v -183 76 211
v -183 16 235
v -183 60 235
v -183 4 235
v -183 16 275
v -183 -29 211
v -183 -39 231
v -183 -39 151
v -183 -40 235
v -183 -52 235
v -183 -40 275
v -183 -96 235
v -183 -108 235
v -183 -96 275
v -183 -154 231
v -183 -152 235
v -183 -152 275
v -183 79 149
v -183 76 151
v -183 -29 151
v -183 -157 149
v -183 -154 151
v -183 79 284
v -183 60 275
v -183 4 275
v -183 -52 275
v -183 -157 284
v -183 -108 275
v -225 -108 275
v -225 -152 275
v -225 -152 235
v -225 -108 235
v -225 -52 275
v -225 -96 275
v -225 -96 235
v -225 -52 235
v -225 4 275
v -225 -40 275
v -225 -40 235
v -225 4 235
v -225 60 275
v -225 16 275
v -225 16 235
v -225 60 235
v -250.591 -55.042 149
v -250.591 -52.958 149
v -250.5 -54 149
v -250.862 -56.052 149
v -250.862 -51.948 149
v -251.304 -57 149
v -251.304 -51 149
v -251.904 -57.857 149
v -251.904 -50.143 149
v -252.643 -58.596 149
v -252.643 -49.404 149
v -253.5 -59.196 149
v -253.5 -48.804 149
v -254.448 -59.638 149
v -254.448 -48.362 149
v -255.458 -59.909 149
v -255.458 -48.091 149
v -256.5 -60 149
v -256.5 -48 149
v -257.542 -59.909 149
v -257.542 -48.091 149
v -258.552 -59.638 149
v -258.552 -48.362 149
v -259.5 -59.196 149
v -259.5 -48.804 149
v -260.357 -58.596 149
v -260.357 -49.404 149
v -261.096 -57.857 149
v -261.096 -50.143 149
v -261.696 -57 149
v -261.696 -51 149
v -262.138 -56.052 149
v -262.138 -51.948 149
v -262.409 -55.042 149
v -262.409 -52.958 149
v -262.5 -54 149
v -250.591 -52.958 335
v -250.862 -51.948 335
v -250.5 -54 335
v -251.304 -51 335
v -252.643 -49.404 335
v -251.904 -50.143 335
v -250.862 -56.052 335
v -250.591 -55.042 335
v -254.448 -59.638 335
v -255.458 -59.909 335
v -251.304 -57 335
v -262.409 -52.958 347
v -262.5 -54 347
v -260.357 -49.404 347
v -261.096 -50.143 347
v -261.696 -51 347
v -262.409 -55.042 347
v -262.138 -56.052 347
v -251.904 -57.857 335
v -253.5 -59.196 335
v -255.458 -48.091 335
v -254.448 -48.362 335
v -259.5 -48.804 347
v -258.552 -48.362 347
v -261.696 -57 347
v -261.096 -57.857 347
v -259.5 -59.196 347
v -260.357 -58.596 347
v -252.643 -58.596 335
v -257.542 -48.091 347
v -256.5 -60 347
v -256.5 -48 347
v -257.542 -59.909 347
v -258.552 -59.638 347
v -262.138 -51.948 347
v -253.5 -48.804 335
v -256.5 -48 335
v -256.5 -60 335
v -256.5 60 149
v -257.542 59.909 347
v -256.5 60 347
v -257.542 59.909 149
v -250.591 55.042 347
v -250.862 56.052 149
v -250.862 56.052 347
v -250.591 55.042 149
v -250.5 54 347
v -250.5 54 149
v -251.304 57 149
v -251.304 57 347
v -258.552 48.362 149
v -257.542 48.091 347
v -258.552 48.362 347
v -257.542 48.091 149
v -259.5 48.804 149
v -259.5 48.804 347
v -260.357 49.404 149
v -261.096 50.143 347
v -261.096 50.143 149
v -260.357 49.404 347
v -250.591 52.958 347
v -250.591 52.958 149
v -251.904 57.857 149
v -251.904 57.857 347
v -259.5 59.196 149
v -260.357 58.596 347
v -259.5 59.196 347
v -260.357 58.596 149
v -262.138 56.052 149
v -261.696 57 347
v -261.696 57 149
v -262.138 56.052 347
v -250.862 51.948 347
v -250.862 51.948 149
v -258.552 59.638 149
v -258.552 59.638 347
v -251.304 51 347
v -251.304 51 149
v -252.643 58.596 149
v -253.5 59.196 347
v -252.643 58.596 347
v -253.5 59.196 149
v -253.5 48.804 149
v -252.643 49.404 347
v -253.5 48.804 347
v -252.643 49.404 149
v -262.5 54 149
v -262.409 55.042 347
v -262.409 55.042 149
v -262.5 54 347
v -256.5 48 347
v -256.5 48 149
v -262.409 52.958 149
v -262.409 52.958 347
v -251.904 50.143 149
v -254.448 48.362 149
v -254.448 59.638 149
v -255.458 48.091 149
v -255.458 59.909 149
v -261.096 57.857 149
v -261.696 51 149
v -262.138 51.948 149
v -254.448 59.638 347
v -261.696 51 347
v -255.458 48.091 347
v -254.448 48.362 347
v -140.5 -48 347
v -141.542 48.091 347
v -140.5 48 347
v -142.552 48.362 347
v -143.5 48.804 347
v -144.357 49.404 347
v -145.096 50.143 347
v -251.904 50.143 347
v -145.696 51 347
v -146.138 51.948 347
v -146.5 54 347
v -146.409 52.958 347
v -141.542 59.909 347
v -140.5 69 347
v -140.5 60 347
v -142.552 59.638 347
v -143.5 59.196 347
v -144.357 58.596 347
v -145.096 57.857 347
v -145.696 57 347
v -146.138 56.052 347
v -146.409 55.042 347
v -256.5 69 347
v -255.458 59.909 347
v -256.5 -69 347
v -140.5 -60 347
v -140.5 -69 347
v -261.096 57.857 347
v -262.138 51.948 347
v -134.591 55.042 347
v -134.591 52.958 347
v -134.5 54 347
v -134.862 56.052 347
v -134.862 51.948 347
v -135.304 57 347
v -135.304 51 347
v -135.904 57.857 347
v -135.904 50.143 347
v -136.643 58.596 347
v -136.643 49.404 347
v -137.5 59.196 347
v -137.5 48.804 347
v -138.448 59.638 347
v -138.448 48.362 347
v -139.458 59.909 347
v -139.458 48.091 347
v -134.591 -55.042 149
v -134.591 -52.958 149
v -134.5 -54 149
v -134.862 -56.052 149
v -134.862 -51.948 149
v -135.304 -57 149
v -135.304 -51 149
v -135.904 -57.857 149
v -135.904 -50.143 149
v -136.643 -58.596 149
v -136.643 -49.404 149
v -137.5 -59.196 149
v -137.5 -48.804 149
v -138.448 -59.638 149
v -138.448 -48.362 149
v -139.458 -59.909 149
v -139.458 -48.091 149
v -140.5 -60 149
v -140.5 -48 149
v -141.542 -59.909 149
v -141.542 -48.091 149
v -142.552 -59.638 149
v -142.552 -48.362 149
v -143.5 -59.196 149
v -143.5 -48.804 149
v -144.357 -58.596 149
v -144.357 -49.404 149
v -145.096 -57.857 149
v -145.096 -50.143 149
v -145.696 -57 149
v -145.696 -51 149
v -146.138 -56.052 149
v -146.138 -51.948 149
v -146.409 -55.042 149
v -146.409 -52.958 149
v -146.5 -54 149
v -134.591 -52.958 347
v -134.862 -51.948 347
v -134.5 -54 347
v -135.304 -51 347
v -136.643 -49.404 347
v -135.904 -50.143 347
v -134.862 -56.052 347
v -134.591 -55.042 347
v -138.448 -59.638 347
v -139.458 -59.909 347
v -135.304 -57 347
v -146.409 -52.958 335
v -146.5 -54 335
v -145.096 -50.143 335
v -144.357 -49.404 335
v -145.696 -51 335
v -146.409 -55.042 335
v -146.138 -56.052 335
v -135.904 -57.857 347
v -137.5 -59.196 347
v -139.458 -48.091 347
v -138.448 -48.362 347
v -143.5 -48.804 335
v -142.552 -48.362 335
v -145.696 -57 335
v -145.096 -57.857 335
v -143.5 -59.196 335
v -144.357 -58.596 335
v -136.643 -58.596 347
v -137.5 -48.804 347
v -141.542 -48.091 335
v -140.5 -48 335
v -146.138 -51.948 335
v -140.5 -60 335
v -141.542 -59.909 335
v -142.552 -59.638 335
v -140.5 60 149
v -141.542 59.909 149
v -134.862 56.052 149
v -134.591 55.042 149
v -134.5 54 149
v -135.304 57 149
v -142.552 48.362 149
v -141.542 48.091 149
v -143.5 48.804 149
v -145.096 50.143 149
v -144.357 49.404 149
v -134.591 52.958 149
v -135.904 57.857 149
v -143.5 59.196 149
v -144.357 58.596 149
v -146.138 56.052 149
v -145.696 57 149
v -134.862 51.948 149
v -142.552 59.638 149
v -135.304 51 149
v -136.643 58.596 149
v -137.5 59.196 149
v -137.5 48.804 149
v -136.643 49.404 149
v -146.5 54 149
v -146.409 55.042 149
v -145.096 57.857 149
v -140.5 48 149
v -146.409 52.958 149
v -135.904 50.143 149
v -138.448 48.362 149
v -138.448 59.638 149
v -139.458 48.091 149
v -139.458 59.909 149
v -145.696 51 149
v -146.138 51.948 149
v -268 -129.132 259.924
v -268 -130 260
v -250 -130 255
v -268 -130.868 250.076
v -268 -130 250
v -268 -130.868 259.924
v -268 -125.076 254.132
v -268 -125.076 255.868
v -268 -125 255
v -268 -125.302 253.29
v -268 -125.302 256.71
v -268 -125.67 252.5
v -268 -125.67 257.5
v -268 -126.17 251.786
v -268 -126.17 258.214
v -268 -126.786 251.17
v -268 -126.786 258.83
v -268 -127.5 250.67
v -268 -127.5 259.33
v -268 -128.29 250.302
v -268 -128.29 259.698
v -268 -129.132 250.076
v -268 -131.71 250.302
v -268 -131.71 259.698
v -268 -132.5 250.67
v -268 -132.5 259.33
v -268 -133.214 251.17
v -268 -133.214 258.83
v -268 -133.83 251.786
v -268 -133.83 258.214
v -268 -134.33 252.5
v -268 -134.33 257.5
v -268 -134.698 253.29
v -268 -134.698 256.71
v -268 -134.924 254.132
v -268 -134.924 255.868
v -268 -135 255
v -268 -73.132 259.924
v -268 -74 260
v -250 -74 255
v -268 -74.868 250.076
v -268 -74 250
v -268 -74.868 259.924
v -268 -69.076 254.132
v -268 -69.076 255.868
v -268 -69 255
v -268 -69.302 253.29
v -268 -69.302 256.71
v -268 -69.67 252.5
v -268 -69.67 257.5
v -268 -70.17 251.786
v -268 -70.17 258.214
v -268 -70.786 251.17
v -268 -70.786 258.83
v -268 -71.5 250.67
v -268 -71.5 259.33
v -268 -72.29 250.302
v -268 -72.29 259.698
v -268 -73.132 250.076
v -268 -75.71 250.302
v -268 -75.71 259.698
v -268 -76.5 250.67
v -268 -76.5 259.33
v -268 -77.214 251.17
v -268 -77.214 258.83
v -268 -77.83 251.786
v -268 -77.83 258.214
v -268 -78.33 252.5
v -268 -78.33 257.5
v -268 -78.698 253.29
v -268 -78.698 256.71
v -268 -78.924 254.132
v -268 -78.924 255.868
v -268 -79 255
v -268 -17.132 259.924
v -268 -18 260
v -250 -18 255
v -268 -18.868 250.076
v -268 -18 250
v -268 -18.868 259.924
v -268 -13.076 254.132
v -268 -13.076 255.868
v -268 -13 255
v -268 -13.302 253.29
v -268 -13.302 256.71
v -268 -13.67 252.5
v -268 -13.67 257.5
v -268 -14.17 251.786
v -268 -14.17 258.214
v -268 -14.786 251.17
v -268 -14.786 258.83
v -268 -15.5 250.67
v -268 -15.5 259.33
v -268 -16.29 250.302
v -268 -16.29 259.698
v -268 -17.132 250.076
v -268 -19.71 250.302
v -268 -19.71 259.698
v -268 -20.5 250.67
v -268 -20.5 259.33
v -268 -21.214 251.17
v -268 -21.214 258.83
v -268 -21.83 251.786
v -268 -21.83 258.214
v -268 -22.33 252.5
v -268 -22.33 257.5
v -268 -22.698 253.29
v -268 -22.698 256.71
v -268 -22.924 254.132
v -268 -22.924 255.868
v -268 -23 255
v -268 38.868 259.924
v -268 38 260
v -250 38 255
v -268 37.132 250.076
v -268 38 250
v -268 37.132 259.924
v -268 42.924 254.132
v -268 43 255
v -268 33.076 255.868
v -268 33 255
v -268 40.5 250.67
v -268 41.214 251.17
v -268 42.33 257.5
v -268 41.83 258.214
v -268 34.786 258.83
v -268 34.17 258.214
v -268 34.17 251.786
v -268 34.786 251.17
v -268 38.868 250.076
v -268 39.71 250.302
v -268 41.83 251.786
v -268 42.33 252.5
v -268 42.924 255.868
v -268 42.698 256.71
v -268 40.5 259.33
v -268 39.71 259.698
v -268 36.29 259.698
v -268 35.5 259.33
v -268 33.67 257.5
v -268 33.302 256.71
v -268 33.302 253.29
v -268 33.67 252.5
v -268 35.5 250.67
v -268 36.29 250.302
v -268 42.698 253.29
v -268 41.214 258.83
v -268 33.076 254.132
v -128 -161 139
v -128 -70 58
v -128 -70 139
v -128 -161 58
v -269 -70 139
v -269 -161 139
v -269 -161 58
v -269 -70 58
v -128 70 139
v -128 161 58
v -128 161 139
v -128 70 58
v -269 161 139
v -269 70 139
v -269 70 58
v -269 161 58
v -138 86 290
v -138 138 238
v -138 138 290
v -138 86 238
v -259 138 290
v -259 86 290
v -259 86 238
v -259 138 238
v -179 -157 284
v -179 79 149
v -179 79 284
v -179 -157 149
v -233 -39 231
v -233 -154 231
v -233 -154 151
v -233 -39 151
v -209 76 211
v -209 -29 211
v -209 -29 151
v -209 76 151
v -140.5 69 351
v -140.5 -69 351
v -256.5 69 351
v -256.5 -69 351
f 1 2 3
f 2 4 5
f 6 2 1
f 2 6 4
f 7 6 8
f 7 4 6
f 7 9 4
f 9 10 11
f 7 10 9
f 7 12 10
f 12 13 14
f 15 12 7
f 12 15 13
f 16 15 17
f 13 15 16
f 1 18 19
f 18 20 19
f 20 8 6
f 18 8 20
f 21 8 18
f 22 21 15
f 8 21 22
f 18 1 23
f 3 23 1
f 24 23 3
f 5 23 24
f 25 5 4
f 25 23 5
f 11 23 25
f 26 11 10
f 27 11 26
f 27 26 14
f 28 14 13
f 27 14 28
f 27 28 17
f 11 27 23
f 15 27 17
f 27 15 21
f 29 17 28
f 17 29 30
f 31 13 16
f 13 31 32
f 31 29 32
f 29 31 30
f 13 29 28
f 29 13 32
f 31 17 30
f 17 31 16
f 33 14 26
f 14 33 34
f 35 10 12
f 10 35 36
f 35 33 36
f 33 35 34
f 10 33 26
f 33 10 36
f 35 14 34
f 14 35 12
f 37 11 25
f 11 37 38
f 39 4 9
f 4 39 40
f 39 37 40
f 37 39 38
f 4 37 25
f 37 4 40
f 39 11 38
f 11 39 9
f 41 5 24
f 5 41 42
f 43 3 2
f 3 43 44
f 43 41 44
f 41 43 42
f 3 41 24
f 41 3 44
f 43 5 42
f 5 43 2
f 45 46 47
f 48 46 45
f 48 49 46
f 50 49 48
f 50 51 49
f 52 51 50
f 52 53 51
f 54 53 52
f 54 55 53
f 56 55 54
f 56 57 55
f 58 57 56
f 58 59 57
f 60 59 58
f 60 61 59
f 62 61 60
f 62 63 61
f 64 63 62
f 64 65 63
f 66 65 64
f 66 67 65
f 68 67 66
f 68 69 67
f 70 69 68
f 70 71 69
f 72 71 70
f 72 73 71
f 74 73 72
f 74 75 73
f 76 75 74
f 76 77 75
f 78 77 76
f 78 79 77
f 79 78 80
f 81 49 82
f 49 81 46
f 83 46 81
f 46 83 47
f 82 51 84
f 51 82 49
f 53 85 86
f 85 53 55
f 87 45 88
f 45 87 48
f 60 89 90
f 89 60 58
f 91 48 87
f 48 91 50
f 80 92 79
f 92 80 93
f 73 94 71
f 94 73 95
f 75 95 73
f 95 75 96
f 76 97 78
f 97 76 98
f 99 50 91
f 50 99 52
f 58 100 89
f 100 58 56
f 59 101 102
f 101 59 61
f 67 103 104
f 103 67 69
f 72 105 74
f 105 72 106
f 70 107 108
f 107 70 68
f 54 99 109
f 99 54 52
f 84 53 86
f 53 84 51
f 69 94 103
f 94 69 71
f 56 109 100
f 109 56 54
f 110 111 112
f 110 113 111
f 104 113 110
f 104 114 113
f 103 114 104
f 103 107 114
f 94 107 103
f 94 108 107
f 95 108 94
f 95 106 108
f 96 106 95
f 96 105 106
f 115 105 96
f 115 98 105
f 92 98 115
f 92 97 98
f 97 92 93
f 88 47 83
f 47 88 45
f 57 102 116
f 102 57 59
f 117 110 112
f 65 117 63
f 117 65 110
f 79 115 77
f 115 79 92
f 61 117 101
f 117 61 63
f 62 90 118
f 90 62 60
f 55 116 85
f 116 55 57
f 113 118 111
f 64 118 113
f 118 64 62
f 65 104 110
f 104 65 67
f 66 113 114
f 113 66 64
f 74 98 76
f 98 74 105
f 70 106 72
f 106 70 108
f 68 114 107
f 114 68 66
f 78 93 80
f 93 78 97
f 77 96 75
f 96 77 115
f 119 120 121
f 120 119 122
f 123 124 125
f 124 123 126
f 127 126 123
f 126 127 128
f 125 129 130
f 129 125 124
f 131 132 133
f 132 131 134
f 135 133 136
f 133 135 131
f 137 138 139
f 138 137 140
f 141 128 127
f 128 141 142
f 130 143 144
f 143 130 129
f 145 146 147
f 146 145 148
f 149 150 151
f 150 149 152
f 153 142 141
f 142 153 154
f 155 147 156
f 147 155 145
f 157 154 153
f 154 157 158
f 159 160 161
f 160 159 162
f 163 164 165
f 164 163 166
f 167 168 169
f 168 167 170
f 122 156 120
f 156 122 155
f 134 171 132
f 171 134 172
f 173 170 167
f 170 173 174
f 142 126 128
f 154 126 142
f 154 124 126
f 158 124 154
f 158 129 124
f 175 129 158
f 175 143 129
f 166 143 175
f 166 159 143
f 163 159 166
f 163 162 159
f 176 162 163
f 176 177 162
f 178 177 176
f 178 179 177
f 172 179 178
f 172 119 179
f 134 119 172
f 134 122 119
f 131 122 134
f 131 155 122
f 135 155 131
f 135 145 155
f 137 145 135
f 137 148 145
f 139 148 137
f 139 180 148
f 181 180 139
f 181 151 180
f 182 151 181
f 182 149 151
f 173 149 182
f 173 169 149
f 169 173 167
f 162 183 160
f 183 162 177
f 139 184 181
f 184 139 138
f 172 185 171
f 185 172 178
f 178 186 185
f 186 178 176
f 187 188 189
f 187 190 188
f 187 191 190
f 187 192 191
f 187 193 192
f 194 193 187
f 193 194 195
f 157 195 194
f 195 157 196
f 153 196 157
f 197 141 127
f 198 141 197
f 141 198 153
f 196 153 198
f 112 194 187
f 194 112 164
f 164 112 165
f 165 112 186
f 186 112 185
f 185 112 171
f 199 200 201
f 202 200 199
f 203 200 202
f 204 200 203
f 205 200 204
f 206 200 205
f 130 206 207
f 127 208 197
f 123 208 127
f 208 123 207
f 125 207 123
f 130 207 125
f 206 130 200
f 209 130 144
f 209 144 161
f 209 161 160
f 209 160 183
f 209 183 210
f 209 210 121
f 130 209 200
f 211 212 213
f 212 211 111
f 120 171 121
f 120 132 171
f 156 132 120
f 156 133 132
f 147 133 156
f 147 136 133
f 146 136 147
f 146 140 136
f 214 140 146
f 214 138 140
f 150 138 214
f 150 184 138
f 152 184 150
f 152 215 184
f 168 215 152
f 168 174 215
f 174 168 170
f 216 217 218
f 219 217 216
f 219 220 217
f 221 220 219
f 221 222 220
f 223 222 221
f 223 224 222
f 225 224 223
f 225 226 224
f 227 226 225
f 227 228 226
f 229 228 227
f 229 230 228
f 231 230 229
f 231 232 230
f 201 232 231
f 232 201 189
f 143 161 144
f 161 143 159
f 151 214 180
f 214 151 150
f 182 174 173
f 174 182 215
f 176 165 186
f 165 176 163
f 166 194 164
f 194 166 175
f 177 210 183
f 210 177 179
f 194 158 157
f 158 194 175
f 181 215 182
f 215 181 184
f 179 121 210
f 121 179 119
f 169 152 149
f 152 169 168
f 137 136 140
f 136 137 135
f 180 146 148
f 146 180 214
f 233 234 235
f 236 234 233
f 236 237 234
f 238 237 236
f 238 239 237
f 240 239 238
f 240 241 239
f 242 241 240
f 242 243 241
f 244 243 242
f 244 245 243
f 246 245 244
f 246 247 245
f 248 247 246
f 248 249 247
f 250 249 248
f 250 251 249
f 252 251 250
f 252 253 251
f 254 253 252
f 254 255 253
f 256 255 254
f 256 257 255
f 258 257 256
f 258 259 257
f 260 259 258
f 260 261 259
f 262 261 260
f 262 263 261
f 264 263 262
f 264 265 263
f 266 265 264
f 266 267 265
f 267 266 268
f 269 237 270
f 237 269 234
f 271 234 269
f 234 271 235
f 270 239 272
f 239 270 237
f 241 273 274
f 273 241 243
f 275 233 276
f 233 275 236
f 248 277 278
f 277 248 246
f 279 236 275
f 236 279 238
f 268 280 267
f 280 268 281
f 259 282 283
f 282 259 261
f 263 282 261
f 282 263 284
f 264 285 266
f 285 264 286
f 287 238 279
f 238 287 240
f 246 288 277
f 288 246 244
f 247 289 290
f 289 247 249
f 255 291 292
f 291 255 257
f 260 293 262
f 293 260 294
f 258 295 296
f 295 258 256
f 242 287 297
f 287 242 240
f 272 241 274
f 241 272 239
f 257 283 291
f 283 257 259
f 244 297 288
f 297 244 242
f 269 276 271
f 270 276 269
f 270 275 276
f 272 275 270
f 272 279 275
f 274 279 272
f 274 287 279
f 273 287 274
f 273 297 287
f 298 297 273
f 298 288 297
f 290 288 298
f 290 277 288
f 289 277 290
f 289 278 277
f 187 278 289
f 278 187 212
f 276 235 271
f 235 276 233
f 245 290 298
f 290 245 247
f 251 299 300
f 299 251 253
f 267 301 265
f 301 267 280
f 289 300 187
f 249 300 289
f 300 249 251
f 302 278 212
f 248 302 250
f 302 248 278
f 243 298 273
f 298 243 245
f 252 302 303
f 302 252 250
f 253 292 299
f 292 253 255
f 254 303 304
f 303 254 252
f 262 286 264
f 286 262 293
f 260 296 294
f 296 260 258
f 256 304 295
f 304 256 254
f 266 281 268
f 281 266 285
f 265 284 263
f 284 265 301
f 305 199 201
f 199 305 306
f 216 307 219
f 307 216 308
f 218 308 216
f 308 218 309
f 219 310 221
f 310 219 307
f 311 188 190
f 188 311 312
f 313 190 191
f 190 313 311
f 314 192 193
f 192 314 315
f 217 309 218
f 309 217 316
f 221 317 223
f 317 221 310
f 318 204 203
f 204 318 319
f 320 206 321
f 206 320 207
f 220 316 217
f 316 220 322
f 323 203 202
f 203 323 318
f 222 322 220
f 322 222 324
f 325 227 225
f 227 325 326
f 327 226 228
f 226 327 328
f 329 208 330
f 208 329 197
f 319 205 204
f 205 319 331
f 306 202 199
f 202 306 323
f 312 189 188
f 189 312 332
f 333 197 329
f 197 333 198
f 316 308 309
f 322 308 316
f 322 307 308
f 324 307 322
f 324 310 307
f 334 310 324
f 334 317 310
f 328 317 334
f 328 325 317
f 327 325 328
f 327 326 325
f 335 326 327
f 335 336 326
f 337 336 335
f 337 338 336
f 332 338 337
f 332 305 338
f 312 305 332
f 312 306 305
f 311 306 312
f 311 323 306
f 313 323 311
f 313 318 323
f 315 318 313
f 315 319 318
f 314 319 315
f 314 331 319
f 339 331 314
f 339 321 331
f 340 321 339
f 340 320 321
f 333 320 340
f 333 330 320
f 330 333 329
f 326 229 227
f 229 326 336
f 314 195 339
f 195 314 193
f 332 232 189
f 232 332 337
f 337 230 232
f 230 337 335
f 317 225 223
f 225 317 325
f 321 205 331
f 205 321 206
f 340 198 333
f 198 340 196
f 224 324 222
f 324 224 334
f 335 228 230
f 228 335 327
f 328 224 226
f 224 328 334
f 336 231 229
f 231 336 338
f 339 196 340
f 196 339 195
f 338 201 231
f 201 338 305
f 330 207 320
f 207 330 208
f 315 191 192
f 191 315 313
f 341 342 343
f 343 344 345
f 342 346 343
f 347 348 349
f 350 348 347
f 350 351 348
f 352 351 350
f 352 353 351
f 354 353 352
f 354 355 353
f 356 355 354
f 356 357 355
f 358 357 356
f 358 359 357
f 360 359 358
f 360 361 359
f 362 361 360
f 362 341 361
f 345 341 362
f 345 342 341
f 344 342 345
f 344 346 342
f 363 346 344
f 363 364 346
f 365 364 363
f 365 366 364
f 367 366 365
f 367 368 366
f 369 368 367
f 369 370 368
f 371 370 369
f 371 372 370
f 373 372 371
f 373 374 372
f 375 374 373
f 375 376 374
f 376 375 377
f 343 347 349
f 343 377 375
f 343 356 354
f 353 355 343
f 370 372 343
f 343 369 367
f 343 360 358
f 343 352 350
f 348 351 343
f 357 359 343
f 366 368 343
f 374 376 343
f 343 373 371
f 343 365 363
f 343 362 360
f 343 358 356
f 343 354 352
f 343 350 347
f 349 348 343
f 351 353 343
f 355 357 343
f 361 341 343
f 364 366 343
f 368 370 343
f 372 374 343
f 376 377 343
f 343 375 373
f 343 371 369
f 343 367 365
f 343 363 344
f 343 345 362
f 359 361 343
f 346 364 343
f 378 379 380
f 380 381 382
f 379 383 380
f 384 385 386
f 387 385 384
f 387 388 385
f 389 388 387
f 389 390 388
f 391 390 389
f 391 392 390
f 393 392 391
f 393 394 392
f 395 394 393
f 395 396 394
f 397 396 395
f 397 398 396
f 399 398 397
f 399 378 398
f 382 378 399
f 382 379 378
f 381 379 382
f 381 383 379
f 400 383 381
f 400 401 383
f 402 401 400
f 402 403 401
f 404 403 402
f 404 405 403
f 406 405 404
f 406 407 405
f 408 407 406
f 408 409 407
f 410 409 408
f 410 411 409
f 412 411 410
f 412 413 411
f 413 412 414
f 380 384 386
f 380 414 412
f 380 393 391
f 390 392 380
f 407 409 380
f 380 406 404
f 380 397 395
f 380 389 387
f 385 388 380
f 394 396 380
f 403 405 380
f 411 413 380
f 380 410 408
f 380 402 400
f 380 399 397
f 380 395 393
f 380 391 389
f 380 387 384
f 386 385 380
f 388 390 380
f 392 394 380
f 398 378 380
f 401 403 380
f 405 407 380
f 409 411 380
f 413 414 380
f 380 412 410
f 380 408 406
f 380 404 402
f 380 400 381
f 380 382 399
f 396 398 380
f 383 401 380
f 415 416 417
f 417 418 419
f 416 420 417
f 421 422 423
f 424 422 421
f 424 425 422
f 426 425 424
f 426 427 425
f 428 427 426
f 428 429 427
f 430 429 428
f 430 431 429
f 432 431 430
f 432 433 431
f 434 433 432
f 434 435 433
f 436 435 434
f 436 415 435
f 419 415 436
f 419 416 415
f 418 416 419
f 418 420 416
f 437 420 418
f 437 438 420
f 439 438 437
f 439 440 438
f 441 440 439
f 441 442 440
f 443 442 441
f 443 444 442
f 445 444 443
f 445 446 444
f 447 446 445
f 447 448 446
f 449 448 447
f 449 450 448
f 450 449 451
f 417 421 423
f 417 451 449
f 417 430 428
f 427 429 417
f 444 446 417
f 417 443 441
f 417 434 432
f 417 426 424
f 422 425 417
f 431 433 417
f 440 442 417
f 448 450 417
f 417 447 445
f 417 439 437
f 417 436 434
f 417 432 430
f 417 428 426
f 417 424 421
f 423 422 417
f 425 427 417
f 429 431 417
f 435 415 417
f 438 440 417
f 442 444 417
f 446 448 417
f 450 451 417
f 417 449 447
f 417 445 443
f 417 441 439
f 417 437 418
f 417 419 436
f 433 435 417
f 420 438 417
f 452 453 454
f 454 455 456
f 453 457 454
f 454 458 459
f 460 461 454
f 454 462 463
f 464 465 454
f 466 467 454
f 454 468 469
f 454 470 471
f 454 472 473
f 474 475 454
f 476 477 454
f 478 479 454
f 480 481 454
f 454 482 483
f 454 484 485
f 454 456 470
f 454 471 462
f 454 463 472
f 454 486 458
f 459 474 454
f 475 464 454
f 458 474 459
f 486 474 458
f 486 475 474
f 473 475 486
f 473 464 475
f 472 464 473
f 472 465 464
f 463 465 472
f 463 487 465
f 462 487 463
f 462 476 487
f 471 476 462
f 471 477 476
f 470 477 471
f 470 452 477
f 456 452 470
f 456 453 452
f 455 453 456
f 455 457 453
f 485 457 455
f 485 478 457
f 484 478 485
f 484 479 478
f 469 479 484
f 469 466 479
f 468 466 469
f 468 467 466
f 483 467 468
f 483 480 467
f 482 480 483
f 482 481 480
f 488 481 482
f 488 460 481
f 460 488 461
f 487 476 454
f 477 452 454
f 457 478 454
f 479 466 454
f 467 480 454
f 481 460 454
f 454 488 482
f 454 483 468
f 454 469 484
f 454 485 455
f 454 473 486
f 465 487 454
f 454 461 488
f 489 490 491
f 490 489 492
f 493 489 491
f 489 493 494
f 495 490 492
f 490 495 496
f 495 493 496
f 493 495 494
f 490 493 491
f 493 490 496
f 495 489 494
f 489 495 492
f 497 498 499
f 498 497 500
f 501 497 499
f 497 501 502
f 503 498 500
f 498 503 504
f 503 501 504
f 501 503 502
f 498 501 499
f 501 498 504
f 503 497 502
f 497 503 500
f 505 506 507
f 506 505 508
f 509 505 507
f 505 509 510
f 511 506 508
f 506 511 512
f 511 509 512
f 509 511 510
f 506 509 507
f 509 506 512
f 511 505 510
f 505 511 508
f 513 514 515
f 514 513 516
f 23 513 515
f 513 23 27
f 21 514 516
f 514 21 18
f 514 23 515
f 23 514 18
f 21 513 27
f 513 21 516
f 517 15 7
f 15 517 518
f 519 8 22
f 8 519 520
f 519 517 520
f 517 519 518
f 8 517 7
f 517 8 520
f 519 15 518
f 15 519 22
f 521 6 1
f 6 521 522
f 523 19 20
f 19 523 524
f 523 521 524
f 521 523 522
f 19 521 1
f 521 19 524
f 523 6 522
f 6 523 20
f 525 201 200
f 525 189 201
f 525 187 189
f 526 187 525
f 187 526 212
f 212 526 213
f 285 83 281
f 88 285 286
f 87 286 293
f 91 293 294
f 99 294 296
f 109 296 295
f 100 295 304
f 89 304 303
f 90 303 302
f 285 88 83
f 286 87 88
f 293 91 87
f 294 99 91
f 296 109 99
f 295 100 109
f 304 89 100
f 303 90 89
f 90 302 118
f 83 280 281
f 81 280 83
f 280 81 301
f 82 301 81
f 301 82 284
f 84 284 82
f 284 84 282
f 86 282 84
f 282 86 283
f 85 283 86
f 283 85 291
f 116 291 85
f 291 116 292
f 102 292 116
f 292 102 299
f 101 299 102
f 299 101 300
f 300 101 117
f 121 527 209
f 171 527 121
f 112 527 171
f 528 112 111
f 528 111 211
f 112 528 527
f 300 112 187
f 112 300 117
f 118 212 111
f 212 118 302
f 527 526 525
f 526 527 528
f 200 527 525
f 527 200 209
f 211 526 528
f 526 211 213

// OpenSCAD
// P2-77 concept-only packaging view for the post-drive-test rear pod.
// This file does not alter rear-pod-v2.scad or any v2 STL.
$fn=36;
view="assembly";

module box(c,s,col=[.5,.5,.5,.6]) { color(col) translate(c) cube(s,center=true); }
module rear_pod_proposal() {
    // Frozen envelope ghost.
    %box([-198.5,0,215],[147,334,320],[.2,.2,.2,.12]);
    // Reserved battery drawers unchanged.
    box([-198.5,-115.5,98.5],[141,91,81],[.15,.35,.8,.5]);
    box([-198.5, 115.5,98.5],[141,91,81],[.15,.35,.8,.5]);
    // Ugreen moved to the free upper +Y side; drawer still opens to -X.
    box([-198.5,112,264],[121,52,52],[.1,.65,.35,.55]);
    // One rear-service carrier; components project toward -X.
    box([-181,-39,216.5],[4,236,135],[.75,.75,.78,.75]);
    box([-207,-96.5,191],[52,115,80],[.85,.45,.12,.75]); // perf + plug/bend
    box([-195,23.5,181],[28,105,60],[.85,.75,.15,.75]);  // Mega
    for(y=[-130,-74,-18,38])
        box([-204,y,255],[42,44,40],[.7,.15,.12,.8]);      // rear-facing BTS
    // Four straight posts and a direct 12 mm local E-stop reaction rib.
    for(x=[-256.5,-140.5],y=[-54,54])
        color([.92,.58,.08]) translate([x,y,149]) cylinder(d=12,h=198);
    box([-198.5,-54,341],[116,12,12],[.95,.58,.05,.9]);
    box([-198.5,0,349],[116,138,4],[.12,.12,.14,.9]);
    // Rear extraction/service direction.
    color([.85,.1,.75]) for(y=[-130,-74,-18,38])
        translate([-250,y,255]) rotate([0,-90,0]) cylinder(d1=0,d2=10,h=18);
}
rear_pod_proposal();
